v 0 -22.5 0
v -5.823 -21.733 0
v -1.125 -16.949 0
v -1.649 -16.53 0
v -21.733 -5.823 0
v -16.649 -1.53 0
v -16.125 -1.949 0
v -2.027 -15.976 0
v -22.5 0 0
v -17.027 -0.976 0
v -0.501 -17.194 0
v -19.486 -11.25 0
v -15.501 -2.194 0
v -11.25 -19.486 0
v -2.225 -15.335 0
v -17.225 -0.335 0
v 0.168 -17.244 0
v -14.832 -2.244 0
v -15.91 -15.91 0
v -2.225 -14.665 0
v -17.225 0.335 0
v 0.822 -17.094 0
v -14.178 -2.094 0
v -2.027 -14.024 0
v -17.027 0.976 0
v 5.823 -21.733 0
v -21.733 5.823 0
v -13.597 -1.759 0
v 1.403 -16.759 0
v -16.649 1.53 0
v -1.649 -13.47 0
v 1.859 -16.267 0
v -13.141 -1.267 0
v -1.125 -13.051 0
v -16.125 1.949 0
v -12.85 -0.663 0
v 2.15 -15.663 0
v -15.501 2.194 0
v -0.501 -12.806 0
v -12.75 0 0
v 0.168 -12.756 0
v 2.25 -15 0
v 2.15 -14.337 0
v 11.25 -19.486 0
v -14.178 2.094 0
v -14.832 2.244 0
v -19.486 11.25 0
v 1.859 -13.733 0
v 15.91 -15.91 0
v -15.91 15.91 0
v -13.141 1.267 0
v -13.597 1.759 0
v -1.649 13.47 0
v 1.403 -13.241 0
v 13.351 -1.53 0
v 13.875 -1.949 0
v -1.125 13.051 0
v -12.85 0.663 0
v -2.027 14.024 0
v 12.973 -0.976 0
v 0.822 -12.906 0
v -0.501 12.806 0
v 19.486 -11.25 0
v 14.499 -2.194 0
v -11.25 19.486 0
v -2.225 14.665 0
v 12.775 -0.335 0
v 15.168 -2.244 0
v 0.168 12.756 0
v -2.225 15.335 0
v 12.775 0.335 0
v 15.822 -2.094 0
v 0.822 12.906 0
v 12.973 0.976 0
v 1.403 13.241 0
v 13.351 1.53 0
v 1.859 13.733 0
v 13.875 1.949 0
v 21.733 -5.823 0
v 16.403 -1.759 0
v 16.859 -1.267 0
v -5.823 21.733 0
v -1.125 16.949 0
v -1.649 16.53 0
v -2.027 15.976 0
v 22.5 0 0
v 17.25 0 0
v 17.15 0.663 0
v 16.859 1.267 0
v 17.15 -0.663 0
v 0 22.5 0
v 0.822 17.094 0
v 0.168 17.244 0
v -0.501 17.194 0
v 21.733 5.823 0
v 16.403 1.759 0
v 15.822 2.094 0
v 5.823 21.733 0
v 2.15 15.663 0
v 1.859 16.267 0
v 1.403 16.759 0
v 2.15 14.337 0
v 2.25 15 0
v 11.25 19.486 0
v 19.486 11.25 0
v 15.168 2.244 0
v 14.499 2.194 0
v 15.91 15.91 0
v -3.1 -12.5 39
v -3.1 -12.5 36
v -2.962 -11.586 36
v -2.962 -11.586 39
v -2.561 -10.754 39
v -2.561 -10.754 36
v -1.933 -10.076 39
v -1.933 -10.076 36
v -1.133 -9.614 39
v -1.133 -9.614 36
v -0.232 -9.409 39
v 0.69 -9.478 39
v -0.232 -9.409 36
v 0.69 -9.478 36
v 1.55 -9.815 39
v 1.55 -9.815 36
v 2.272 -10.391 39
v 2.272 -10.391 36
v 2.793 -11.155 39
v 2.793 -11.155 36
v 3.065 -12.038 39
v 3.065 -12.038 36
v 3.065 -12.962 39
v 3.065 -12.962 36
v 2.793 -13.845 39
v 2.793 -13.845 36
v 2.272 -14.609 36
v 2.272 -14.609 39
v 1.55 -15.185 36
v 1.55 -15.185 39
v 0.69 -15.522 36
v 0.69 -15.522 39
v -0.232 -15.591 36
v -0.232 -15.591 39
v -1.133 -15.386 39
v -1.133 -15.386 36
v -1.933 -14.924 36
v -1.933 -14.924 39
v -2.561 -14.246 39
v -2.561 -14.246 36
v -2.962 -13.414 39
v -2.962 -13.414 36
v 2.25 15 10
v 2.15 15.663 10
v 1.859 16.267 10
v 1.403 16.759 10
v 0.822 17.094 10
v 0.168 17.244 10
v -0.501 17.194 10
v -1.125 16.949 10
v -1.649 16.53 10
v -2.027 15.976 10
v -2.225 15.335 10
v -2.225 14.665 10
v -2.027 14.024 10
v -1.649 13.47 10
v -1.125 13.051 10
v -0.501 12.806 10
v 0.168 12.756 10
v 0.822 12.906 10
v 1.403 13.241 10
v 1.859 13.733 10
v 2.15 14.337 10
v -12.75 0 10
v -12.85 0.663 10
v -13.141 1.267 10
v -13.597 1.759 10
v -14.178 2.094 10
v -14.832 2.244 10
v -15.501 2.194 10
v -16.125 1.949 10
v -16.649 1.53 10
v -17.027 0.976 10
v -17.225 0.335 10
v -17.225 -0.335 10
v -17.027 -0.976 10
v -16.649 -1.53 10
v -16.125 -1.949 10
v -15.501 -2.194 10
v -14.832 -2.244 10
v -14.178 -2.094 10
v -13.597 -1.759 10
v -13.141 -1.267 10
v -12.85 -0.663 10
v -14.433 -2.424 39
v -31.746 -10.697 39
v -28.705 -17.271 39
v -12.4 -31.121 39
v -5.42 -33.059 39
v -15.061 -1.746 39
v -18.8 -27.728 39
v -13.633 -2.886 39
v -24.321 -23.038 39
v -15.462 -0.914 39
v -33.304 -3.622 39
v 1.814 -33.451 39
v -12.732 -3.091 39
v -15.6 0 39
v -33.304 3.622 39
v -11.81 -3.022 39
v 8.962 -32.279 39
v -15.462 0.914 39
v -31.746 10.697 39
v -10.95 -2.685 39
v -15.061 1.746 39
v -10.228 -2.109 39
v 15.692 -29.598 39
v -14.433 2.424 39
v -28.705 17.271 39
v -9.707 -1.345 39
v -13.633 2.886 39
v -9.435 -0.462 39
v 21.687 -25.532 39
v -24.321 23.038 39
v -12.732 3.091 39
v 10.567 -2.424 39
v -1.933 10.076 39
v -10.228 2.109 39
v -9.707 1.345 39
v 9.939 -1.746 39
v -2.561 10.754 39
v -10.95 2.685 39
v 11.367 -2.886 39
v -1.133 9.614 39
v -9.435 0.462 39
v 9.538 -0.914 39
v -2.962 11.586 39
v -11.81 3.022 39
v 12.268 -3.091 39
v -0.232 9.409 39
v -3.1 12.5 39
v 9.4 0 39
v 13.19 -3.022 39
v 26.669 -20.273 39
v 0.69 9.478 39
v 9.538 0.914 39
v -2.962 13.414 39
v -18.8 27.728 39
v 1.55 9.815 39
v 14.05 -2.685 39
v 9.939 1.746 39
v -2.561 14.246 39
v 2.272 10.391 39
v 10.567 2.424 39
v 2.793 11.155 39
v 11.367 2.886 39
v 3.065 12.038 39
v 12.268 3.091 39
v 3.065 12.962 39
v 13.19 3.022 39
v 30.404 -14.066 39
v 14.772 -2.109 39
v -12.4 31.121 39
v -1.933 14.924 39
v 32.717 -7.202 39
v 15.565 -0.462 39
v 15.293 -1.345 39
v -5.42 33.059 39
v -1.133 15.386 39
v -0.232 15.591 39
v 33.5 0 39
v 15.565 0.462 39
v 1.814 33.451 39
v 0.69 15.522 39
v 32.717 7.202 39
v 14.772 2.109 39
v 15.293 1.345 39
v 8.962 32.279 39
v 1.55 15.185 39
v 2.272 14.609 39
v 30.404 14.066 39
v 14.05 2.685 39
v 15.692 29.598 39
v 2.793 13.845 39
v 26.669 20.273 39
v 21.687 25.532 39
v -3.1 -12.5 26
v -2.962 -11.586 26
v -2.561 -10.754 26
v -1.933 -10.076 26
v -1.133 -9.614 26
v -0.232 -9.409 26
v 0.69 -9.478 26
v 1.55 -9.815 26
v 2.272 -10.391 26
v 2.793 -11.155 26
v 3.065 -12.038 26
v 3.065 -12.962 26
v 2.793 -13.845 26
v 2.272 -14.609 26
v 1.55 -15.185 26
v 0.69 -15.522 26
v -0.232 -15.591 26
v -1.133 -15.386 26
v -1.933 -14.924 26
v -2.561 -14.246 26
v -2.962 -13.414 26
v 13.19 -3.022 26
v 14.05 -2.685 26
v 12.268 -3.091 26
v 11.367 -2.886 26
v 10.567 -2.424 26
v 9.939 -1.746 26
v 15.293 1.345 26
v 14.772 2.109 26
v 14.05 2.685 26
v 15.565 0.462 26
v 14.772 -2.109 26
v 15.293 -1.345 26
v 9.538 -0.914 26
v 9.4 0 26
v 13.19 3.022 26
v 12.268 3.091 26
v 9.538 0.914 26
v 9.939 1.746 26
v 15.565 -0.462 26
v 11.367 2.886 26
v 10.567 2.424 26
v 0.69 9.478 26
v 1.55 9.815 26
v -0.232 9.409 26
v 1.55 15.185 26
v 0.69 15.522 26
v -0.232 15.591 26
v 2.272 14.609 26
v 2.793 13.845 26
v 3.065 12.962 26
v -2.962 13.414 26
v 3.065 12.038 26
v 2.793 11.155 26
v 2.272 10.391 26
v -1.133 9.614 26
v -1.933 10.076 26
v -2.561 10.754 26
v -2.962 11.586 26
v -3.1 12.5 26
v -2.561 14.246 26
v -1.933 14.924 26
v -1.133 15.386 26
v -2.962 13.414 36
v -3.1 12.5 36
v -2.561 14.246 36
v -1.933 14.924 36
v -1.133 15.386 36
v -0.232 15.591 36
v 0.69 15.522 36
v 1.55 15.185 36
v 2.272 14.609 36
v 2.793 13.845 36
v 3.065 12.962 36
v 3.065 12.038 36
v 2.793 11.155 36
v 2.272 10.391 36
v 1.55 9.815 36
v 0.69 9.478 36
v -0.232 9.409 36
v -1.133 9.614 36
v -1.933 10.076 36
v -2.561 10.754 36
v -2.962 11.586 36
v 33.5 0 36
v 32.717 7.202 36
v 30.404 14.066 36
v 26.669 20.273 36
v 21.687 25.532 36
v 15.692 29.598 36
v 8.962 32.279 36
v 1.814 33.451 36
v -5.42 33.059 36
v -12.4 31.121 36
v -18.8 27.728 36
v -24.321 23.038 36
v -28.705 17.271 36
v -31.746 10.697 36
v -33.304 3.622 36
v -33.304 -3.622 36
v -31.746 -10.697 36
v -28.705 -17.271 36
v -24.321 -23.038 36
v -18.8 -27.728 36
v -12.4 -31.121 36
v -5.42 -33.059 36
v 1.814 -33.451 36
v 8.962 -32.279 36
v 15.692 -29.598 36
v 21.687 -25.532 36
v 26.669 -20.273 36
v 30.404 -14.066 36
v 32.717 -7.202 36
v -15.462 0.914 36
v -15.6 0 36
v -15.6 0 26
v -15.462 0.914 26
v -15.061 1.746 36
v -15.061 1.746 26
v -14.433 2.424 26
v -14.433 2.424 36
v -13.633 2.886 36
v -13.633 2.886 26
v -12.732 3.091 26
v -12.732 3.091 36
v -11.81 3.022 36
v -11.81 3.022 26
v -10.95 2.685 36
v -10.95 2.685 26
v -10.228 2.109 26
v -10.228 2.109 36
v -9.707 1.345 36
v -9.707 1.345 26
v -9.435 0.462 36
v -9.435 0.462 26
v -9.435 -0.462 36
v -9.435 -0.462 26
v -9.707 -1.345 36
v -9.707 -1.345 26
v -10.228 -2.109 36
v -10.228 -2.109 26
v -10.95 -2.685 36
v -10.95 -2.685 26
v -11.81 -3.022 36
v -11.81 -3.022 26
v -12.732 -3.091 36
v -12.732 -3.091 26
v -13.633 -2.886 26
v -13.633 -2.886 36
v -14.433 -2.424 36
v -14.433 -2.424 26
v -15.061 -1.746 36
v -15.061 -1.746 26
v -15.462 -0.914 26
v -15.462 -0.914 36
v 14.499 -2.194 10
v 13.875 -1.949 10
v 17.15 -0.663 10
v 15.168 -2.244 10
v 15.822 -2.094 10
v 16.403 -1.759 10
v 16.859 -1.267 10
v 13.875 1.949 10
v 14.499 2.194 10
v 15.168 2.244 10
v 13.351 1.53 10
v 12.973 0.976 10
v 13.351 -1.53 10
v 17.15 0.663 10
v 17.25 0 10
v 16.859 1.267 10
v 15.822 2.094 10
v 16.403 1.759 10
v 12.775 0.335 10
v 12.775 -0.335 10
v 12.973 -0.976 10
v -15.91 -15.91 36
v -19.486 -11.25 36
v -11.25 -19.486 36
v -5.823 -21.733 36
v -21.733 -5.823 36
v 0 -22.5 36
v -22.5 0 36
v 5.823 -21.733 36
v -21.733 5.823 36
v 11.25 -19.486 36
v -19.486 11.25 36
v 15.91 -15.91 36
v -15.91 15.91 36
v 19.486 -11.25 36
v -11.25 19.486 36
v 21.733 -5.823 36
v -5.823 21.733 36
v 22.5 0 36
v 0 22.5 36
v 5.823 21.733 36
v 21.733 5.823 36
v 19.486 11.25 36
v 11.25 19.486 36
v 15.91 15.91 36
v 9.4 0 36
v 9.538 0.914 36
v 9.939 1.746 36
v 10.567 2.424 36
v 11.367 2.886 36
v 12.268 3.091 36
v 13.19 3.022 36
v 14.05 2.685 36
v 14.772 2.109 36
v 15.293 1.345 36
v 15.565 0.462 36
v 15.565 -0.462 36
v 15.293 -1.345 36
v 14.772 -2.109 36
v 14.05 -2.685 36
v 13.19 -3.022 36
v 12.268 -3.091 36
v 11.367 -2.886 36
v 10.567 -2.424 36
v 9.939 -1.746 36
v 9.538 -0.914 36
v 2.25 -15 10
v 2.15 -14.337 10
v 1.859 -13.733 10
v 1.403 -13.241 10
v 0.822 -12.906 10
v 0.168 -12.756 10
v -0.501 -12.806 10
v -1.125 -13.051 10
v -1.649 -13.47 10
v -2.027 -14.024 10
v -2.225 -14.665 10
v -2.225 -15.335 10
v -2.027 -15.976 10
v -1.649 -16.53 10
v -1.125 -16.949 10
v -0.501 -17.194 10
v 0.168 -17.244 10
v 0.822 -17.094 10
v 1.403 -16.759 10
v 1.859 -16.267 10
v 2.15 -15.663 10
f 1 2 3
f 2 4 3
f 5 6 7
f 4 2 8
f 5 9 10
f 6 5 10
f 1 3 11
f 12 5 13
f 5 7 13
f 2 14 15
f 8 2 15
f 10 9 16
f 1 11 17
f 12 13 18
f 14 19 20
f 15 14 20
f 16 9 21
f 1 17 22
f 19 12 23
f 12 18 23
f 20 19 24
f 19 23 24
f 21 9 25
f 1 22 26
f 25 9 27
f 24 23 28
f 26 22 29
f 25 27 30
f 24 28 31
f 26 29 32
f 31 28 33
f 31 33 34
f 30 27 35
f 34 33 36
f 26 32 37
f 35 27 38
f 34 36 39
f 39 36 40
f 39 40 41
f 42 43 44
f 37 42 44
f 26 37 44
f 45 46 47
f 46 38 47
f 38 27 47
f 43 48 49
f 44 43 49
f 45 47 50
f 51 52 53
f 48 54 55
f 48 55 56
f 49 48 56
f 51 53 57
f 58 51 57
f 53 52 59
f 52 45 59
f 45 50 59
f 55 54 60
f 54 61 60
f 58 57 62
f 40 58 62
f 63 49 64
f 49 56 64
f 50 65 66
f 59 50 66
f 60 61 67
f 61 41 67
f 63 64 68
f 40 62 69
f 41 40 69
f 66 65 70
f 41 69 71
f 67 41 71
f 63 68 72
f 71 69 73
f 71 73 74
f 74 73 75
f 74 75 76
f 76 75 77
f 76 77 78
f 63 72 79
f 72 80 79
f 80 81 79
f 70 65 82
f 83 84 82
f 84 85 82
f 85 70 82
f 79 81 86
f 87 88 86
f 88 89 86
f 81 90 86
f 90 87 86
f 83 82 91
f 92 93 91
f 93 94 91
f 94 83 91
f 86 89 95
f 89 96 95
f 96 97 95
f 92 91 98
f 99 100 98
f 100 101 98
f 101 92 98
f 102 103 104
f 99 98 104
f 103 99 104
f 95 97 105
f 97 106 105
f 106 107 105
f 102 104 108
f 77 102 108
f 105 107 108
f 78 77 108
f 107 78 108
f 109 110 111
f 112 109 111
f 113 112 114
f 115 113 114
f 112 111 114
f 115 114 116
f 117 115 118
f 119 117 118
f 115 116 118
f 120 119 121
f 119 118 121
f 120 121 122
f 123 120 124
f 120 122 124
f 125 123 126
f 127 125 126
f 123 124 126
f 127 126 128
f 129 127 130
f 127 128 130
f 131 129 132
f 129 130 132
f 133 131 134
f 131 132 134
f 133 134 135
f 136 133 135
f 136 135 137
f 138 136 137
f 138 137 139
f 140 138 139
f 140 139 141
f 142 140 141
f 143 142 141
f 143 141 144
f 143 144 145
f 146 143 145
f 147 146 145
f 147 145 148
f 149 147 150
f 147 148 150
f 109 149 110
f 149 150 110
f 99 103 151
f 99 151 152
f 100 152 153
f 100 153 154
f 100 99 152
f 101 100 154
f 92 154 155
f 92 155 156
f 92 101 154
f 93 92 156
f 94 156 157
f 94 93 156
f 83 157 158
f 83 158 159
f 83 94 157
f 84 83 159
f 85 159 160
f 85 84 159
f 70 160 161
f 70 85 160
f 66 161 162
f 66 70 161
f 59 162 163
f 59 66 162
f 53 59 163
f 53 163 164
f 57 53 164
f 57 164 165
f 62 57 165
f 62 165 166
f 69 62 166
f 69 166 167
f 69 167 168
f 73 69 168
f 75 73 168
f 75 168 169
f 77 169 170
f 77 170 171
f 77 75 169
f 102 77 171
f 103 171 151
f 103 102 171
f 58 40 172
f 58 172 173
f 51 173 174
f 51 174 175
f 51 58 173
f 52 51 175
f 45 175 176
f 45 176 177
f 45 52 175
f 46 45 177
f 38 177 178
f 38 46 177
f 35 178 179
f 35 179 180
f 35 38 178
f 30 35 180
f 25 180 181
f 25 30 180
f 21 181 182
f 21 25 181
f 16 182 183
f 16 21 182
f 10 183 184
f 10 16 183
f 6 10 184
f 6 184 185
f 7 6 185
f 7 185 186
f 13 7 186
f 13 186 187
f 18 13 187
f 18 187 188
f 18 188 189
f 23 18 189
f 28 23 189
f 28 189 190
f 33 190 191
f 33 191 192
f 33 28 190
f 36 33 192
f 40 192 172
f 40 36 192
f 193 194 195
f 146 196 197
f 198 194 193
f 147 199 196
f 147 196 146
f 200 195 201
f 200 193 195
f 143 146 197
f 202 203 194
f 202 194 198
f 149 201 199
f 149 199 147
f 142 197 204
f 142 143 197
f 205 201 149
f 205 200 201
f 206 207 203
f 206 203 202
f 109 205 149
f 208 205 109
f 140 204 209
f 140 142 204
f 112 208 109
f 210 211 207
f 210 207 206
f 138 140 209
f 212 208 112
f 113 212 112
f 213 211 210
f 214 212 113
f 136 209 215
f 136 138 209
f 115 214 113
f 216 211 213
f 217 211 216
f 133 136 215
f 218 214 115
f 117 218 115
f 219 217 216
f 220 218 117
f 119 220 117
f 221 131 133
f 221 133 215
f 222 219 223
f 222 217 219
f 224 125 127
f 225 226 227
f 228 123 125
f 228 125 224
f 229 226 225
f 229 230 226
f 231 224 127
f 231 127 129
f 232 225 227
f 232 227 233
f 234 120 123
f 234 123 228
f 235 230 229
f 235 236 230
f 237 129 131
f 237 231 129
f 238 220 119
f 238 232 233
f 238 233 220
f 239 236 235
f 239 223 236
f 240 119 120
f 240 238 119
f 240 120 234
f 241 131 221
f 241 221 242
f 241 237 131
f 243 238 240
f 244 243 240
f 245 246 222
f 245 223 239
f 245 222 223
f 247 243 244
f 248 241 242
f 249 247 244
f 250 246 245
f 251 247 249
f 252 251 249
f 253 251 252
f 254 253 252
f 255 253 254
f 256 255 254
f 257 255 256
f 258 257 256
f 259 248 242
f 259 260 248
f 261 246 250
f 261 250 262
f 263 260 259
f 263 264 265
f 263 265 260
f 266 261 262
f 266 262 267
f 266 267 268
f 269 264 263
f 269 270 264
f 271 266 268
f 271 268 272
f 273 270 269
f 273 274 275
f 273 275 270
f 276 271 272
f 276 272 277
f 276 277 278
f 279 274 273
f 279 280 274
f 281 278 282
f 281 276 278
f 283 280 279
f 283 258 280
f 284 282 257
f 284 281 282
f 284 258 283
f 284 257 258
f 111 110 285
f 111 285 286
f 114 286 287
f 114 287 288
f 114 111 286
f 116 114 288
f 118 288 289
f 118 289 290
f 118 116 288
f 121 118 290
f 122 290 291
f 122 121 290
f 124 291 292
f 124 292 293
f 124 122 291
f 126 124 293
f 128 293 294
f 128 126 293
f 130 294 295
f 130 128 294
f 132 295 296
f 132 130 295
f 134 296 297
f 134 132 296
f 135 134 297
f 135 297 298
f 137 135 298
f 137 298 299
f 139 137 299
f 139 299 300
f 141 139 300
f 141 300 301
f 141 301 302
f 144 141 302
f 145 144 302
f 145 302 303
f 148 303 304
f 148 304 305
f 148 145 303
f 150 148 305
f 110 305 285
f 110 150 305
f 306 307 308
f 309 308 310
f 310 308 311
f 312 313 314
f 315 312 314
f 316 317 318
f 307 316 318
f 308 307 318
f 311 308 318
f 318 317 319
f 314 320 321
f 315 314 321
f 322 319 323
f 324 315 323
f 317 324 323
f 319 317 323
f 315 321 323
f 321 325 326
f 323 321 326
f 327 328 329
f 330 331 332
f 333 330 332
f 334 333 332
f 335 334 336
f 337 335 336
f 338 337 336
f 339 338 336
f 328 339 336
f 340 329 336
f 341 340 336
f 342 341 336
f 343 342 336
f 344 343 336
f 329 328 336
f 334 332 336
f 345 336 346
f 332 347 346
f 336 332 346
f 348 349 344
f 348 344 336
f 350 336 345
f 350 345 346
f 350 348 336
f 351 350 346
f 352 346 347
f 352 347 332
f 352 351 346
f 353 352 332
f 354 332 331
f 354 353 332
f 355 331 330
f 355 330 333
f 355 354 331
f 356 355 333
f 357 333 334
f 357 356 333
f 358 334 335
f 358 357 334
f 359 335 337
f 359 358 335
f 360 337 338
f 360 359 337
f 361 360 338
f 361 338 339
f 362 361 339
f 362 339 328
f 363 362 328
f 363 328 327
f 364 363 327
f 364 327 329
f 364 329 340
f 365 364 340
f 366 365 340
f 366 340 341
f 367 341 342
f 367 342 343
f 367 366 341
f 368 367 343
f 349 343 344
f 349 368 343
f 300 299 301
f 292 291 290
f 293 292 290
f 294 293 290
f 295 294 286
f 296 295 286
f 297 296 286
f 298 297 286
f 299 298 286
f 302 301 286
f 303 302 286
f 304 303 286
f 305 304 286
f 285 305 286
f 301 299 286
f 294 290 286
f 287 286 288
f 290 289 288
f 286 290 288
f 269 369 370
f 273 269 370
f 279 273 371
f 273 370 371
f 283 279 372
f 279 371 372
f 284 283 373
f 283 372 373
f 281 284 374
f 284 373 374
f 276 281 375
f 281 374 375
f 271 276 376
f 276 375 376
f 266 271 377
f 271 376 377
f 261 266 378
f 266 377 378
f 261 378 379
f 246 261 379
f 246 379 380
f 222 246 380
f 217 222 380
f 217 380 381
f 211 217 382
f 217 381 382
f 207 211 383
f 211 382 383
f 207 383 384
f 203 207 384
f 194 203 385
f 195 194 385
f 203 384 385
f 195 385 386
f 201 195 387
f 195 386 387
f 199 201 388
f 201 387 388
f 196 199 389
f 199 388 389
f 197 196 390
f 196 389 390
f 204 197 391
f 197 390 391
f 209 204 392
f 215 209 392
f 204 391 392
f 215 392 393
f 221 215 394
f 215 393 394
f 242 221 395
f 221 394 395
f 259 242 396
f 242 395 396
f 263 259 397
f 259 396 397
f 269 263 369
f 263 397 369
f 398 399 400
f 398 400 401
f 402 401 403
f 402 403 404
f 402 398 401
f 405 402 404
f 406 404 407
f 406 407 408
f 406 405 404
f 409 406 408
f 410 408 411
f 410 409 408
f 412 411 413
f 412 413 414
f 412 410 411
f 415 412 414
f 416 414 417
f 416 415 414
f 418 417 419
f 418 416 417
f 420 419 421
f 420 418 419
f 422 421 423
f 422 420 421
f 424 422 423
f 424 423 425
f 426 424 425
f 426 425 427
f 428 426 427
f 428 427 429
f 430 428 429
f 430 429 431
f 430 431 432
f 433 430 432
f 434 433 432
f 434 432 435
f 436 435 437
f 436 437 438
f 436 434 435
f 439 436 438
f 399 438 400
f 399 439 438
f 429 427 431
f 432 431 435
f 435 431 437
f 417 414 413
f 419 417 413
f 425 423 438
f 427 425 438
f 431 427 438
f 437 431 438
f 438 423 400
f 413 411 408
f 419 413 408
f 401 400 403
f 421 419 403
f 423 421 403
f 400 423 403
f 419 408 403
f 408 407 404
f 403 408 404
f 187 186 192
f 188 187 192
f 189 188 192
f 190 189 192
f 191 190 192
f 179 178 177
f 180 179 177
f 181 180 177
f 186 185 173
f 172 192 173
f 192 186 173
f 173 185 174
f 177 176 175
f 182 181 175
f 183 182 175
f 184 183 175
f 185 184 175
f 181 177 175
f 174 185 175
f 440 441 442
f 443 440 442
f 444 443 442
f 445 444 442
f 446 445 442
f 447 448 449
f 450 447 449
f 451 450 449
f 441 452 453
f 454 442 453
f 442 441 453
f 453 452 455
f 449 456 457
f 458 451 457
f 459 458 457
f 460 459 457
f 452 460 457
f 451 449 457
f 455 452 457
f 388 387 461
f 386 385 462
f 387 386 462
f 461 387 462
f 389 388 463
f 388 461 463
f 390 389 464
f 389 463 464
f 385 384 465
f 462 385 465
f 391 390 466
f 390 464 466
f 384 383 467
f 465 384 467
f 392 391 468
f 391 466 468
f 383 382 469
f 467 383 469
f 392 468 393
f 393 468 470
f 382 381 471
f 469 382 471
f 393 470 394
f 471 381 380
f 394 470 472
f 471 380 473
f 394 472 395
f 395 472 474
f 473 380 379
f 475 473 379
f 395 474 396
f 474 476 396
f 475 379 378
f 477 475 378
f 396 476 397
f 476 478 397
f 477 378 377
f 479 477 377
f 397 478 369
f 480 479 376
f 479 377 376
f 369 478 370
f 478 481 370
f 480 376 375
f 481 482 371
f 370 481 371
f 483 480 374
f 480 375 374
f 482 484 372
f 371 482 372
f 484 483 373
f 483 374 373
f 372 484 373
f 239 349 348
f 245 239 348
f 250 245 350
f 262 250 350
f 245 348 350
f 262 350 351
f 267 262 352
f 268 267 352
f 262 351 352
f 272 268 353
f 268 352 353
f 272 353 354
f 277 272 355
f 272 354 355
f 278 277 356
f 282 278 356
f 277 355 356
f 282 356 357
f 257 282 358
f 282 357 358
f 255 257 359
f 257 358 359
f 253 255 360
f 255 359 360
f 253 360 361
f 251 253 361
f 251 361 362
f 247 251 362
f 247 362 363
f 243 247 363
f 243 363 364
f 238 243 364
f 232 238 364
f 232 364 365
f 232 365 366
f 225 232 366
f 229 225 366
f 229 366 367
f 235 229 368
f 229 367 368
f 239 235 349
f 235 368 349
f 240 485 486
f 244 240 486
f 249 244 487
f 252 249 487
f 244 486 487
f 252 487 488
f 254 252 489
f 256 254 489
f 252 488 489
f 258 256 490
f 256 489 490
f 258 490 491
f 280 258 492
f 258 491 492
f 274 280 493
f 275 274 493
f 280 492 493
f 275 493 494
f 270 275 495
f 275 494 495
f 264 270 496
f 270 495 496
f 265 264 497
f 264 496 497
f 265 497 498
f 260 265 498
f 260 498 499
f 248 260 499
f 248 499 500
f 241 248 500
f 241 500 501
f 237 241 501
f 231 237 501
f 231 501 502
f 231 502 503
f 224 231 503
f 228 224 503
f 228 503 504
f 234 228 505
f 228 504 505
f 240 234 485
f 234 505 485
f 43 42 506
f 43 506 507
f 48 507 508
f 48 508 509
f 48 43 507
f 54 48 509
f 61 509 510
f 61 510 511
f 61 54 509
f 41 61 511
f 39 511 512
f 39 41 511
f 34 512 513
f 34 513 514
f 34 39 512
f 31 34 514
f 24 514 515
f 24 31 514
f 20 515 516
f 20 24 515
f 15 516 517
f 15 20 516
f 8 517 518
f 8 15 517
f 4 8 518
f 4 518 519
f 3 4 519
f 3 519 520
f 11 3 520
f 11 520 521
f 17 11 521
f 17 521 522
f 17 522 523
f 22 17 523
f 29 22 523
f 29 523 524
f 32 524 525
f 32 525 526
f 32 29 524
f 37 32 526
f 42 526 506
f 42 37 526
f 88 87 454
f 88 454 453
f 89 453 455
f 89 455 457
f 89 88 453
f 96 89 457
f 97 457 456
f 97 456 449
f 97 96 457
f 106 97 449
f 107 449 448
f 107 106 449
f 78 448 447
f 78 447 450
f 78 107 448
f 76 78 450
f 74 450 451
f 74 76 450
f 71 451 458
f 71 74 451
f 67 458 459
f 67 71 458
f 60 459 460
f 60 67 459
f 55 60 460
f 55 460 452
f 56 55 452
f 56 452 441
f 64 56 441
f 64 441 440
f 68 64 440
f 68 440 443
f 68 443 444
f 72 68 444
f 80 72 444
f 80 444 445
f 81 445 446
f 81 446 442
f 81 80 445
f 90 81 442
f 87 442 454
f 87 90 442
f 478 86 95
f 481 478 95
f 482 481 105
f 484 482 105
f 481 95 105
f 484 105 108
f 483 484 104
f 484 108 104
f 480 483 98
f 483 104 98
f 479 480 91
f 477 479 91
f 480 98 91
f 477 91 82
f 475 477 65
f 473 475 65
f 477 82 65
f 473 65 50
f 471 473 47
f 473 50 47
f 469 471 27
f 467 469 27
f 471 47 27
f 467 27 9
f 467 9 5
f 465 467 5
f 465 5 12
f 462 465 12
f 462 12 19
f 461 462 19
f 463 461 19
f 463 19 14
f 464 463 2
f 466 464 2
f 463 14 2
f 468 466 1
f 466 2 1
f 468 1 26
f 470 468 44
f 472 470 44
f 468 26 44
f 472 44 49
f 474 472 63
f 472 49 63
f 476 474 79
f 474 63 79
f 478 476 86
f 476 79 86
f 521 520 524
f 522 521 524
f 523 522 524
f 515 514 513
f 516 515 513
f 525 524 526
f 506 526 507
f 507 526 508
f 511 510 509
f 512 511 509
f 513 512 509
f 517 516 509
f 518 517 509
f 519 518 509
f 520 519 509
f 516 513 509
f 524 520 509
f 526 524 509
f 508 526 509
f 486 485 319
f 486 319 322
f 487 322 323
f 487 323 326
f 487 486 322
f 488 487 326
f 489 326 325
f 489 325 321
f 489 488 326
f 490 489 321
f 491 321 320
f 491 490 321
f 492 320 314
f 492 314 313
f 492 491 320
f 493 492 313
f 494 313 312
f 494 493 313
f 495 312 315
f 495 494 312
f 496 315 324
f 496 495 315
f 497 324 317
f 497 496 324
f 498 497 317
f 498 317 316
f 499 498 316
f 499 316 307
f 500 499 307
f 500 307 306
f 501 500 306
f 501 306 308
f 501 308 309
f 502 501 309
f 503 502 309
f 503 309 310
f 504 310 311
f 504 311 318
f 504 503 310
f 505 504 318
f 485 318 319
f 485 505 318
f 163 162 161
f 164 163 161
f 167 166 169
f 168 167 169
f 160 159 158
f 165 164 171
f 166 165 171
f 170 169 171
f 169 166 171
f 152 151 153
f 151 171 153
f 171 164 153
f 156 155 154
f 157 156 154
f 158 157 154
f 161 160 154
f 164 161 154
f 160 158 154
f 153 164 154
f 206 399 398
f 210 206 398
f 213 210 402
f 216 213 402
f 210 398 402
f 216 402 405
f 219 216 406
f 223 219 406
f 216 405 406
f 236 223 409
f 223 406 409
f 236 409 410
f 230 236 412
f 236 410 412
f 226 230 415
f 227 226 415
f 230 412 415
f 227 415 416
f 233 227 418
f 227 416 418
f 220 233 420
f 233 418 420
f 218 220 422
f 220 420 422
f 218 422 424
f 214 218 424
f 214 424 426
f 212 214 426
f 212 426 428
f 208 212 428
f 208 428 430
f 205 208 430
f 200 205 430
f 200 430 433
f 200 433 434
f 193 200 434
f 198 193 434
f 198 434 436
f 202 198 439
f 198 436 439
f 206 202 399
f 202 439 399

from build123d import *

# Parameters (mm, degrees)
SKETCH1_R               = 22.5
BOSS_EXTRUDE1_DEPTH     = 36
SKETCH1_3_R             = 2.25
CUT_EXTRUDE1_DEPTH      = 10
SKETCH2_R               = 33.5
BOSS_EXTRUDE2_DEPTH     = 3
CUT_EXTRUDE2_DEPTH      = 10
CUT_EXTRUDE2_DEPTH_BACK = 3
SKETCH3_R               = 3.1


with BuildPart() as part:
    # Sketch1 → Boss-Extrude1 (new body)
    with BuildSketch(Plane.XY):
        Circle(SKETCH1_R)
    extrude(amount=BOSS_EXTRUDE1_DEPTH)

    # Sketch1<3> → Cut-Extrude1 (cut)
    with BuildSketch(Plane.XY):
        with Locations((0, 15)):
            Circle(SKETCH1_3_R)
        with Locations((15, 0)):
            Circle(SKETCH1_3_R)
        with Locations((0, -15)):
            Circle(SKETCH1_3_R)
        with Locations((-15, 0)):
            Circle(SKETCH1_3_R)
    extrude(amount=CUT_EXTRUDE1_DEPTH, mode=Mode.SUBTRACT)

    # Sketch2 → Boss-Extrude2 (add)
    with BuildSketch(Plane.XY.offset(36)):
        Circle(SKETCH2_R)
    extrude(amount=BOSS_EXTRUDE2_DEPTH)

    # Sketch3 → Cut-Extrude2 (cut, two sides: drawn at the far end of the back side and taken through both)
    with BuildSketch(Plane(origin=(0, 0, 36), x_dir=(-1, 0, 0), z_dir=(0, 0, -1)).offset(-CUT_EXTRUDE2_DEPTH_BACK)):
        with Locations((0, 12.5)):
            Circle(SKETCH3_R)
        with Locations((12.5, 0)):
            Circle(SKETCH3_R)
        with Locations((0, -12.5)):
            Circle(SKETCH3_R)
        with Locations((-12.5, 0)):
            Circle(SKETCH3_R)
    extrude(amount=CUT_EXTRUDE2_DEPTH + CUT_EXTRUDE2_DEPTH_BACK, mode=Mode.SUBTRACT)


solid = part.part
